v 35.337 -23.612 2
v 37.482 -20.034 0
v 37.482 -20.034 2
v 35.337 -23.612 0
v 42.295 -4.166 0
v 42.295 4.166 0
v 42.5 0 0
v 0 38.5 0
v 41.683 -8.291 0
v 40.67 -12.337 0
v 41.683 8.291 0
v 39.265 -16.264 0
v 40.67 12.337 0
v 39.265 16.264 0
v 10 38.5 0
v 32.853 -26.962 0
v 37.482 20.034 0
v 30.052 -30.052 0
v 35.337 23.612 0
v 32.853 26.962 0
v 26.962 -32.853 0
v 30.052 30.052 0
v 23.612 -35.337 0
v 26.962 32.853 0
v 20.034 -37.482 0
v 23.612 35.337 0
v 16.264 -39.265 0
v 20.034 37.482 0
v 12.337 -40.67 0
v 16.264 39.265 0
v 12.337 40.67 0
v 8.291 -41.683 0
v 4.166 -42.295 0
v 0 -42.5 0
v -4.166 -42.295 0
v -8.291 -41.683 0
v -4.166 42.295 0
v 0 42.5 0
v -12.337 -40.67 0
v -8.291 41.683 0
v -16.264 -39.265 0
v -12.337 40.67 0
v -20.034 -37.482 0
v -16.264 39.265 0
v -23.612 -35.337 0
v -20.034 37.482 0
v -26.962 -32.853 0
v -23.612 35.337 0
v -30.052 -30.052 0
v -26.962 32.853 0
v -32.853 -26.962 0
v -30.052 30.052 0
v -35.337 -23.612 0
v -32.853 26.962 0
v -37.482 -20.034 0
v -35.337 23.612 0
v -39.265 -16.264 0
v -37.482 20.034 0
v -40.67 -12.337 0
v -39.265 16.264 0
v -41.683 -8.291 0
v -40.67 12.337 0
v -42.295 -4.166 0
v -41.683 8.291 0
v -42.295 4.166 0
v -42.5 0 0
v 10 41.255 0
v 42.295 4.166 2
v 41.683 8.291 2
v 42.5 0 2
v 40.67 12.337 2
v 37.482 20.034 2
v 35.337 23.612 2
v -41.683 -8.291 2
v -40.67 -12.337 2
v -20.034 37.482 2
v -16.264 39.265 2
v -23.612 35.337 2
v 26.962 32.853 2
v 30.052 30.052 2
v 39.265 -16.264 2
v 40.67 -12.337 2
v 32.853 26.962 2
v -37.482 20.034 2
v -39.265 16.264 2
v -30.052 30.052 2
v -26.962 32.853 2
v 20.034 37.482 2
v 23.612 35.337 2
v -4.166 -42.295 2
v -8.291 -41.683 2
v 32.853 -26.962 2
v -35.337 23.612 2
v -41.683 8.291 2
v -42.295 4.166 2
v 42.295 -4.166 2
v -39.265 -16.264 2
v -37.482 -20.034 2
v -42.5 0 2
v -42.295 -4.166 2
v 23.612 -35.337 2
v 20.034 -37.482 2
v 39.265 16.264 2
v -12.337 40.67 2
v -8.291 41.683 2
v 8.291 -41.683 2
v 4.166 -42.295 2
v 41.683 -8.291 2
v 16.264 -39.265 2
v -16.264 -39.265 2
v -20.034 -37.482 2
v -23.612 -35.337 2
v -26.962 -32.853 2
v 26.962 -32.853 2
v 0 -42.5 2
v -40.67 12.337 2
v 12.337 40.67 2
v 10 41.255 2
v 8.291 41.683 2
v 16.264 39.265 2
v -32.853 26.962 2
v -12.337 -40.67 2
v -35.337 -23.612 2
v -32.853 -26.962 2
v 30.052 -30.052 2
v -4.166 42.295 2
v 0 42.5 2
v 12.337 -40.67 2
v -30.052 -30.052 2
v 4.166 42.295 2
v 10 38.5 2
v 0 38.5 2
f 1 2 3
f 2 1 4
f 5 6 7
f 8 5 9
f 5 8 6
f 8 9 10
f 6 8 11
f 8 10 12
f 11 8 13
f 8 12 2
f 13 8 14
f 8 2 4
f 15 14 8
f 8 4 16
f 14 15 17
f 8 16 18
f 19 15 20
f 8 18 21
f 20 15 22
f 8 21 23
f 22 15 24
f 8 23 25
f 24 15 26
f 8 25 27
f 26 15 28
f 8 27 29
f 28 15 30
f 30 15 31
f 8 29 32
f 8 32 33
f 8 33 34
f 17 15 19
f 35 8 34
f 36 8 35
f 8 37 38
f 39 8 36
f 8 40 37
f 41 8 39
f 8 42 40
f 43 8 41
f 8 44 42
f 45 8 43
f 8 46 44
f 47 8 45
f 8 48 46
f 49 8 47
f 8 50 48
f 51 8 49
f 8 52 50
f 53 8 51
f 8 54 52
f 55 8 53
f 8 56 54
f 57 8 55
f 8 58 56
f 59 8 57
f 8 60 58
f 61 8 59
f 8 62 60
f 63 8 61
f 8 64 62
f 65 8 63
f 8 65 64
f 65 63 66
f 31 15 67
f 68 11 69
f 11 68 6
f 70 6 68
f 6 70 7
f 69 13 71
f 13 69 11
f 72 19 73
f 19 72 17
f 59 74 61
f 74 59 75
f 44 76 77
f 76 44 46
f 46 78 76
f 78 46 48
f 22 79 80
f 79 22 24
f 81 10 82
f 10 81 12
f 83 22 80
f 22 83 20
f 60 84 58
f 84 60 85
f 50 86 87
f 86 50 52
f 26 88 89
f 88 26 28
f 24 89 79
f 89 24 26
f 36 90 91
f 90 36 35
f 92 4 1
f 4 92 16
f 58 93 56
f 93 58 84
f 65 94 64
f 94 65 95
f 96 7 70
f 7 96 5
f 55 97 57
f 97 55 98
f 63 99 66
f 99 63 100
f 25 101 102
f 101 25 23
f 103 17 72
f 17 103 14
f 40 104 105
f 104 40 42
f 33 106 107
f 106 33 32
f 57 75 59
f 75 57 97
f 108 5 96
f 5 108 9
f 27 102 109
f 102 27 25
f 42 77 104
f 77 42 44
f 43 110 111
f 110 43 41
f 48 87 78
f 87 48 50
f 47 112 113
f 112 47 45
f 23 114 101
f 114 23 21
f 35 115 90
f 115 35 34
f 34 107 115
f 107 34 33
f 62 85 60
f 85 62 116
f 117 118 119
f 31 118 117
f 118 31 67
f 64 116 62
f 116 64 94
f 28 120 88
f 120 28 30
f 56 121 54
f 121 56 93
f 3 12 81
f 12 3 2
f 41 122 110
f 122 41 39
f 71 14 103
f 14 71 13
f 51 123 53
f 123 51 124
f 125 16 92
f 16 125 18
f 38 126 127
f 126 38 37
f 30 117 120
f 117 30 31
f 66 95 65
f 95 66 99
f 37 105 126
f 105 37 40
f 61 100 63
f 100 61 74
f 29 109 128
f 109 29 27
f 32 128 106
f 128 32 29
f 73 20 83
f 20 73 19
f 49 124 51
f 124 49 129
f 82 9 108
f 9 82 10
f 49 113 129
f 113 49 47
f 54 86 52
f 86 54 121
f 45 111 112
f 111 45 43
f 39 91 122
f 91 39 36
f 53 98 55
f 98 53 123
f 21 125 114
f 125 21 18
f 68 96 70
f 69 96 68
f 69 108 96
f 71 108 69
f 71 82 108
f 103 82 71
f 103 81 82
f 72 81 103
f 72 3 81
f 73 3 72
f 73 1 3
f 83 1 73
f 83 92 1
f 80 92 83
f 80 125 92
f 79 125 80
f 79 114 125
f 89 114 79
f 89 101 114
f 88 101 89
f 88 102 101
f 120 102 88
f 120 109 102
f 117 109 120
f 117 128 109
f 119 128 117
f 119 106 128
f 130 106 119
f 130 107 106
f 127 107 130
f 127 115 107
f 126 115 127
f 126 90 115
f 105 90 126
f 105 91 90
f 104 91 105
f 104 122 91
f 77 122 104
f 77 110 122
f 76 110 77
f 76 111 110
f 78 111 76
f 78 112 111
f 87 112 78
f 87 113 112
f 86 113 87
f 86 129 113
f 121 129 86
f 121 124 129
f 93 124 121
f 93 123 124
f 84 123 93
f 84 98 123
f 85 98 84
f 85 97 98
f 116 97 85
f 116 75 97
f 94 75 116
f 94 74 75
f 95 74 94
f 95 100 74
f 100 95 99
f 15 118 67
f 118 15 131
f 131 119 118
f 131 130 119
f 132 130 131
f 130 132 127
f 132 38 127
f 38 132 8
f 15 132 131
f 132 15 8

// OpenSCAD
// Sowing template for a 90 mm Petri dish.
// Flat disc 85 mm diameter, 2 mm thick.
// 7x7 grid of 3 mm holes, 9 mm spacing, centred.
// Rectangular notch on the +Y rim: 10 mm wide, 4 mm deep.

$fn = 64;

// Dimensions
DISC_DIA = 85;
THICKNESS = 2;
GRID_SIZE = 7;
HOLE_DIA = 3;
HOLE_SPACING = 9;
NOTCH_WIDTH = 10;
NOTCH_DEPTH = 4;

// Calculate grid positions
// Total span = (7-1) * 9 = 54mm. Half span = 27mm.
// We want the grid to be centred at 0,0.
GRID_HALF_SPAN = (GRID_SIZE - 1) * HOLE_SPACING / 2;

difference() {
    // Main disc body
    translate([0, 0, 0])
        cylinder(h = THICKNESS, d = DISC_DIA);

    // Grid of holes
    // Loop i from 0 to 6.
    // Position = (i - (GRID_SIZE-1)/2) * spacing
    // For i=3 (middle), pos = 0.
    for (i = [0 : GRID_SIZE - 1]) {
        x = (i - GRID_HALF_SPAN) * HOLE_SPACING;
        y = (i - GRID_HALF_SPAN) * HOLE_SPACING;
        
        // Cut hole extending slightly past the face
        translate([x, y, -0.01])
            cylinder(h = THICKNESS + 0.01, d = HOLE_DIA);
    }

    // Rectangular orientation notch on the +Y side
    // Notch is 10mm wide (X) and 4mm deep (Y, measured in from rim).
    // Rim radius is DISC_DIA / 2 = 42.5 mm.
    // Notch starts at Y = 42.5 - 4 = 38.5 mm.
    // Notch is centred on Y axis, so X range is [-5, 5].
    
    notch_start_y = DISC_DIA / 2 - NOTCH_DEPTH;
    
    translate([0, notch_start_y, -0.01])
        cube([NOTCH_WIDTH, NOTCH_DEPTH, THICKNESS + 0.01]);
}
